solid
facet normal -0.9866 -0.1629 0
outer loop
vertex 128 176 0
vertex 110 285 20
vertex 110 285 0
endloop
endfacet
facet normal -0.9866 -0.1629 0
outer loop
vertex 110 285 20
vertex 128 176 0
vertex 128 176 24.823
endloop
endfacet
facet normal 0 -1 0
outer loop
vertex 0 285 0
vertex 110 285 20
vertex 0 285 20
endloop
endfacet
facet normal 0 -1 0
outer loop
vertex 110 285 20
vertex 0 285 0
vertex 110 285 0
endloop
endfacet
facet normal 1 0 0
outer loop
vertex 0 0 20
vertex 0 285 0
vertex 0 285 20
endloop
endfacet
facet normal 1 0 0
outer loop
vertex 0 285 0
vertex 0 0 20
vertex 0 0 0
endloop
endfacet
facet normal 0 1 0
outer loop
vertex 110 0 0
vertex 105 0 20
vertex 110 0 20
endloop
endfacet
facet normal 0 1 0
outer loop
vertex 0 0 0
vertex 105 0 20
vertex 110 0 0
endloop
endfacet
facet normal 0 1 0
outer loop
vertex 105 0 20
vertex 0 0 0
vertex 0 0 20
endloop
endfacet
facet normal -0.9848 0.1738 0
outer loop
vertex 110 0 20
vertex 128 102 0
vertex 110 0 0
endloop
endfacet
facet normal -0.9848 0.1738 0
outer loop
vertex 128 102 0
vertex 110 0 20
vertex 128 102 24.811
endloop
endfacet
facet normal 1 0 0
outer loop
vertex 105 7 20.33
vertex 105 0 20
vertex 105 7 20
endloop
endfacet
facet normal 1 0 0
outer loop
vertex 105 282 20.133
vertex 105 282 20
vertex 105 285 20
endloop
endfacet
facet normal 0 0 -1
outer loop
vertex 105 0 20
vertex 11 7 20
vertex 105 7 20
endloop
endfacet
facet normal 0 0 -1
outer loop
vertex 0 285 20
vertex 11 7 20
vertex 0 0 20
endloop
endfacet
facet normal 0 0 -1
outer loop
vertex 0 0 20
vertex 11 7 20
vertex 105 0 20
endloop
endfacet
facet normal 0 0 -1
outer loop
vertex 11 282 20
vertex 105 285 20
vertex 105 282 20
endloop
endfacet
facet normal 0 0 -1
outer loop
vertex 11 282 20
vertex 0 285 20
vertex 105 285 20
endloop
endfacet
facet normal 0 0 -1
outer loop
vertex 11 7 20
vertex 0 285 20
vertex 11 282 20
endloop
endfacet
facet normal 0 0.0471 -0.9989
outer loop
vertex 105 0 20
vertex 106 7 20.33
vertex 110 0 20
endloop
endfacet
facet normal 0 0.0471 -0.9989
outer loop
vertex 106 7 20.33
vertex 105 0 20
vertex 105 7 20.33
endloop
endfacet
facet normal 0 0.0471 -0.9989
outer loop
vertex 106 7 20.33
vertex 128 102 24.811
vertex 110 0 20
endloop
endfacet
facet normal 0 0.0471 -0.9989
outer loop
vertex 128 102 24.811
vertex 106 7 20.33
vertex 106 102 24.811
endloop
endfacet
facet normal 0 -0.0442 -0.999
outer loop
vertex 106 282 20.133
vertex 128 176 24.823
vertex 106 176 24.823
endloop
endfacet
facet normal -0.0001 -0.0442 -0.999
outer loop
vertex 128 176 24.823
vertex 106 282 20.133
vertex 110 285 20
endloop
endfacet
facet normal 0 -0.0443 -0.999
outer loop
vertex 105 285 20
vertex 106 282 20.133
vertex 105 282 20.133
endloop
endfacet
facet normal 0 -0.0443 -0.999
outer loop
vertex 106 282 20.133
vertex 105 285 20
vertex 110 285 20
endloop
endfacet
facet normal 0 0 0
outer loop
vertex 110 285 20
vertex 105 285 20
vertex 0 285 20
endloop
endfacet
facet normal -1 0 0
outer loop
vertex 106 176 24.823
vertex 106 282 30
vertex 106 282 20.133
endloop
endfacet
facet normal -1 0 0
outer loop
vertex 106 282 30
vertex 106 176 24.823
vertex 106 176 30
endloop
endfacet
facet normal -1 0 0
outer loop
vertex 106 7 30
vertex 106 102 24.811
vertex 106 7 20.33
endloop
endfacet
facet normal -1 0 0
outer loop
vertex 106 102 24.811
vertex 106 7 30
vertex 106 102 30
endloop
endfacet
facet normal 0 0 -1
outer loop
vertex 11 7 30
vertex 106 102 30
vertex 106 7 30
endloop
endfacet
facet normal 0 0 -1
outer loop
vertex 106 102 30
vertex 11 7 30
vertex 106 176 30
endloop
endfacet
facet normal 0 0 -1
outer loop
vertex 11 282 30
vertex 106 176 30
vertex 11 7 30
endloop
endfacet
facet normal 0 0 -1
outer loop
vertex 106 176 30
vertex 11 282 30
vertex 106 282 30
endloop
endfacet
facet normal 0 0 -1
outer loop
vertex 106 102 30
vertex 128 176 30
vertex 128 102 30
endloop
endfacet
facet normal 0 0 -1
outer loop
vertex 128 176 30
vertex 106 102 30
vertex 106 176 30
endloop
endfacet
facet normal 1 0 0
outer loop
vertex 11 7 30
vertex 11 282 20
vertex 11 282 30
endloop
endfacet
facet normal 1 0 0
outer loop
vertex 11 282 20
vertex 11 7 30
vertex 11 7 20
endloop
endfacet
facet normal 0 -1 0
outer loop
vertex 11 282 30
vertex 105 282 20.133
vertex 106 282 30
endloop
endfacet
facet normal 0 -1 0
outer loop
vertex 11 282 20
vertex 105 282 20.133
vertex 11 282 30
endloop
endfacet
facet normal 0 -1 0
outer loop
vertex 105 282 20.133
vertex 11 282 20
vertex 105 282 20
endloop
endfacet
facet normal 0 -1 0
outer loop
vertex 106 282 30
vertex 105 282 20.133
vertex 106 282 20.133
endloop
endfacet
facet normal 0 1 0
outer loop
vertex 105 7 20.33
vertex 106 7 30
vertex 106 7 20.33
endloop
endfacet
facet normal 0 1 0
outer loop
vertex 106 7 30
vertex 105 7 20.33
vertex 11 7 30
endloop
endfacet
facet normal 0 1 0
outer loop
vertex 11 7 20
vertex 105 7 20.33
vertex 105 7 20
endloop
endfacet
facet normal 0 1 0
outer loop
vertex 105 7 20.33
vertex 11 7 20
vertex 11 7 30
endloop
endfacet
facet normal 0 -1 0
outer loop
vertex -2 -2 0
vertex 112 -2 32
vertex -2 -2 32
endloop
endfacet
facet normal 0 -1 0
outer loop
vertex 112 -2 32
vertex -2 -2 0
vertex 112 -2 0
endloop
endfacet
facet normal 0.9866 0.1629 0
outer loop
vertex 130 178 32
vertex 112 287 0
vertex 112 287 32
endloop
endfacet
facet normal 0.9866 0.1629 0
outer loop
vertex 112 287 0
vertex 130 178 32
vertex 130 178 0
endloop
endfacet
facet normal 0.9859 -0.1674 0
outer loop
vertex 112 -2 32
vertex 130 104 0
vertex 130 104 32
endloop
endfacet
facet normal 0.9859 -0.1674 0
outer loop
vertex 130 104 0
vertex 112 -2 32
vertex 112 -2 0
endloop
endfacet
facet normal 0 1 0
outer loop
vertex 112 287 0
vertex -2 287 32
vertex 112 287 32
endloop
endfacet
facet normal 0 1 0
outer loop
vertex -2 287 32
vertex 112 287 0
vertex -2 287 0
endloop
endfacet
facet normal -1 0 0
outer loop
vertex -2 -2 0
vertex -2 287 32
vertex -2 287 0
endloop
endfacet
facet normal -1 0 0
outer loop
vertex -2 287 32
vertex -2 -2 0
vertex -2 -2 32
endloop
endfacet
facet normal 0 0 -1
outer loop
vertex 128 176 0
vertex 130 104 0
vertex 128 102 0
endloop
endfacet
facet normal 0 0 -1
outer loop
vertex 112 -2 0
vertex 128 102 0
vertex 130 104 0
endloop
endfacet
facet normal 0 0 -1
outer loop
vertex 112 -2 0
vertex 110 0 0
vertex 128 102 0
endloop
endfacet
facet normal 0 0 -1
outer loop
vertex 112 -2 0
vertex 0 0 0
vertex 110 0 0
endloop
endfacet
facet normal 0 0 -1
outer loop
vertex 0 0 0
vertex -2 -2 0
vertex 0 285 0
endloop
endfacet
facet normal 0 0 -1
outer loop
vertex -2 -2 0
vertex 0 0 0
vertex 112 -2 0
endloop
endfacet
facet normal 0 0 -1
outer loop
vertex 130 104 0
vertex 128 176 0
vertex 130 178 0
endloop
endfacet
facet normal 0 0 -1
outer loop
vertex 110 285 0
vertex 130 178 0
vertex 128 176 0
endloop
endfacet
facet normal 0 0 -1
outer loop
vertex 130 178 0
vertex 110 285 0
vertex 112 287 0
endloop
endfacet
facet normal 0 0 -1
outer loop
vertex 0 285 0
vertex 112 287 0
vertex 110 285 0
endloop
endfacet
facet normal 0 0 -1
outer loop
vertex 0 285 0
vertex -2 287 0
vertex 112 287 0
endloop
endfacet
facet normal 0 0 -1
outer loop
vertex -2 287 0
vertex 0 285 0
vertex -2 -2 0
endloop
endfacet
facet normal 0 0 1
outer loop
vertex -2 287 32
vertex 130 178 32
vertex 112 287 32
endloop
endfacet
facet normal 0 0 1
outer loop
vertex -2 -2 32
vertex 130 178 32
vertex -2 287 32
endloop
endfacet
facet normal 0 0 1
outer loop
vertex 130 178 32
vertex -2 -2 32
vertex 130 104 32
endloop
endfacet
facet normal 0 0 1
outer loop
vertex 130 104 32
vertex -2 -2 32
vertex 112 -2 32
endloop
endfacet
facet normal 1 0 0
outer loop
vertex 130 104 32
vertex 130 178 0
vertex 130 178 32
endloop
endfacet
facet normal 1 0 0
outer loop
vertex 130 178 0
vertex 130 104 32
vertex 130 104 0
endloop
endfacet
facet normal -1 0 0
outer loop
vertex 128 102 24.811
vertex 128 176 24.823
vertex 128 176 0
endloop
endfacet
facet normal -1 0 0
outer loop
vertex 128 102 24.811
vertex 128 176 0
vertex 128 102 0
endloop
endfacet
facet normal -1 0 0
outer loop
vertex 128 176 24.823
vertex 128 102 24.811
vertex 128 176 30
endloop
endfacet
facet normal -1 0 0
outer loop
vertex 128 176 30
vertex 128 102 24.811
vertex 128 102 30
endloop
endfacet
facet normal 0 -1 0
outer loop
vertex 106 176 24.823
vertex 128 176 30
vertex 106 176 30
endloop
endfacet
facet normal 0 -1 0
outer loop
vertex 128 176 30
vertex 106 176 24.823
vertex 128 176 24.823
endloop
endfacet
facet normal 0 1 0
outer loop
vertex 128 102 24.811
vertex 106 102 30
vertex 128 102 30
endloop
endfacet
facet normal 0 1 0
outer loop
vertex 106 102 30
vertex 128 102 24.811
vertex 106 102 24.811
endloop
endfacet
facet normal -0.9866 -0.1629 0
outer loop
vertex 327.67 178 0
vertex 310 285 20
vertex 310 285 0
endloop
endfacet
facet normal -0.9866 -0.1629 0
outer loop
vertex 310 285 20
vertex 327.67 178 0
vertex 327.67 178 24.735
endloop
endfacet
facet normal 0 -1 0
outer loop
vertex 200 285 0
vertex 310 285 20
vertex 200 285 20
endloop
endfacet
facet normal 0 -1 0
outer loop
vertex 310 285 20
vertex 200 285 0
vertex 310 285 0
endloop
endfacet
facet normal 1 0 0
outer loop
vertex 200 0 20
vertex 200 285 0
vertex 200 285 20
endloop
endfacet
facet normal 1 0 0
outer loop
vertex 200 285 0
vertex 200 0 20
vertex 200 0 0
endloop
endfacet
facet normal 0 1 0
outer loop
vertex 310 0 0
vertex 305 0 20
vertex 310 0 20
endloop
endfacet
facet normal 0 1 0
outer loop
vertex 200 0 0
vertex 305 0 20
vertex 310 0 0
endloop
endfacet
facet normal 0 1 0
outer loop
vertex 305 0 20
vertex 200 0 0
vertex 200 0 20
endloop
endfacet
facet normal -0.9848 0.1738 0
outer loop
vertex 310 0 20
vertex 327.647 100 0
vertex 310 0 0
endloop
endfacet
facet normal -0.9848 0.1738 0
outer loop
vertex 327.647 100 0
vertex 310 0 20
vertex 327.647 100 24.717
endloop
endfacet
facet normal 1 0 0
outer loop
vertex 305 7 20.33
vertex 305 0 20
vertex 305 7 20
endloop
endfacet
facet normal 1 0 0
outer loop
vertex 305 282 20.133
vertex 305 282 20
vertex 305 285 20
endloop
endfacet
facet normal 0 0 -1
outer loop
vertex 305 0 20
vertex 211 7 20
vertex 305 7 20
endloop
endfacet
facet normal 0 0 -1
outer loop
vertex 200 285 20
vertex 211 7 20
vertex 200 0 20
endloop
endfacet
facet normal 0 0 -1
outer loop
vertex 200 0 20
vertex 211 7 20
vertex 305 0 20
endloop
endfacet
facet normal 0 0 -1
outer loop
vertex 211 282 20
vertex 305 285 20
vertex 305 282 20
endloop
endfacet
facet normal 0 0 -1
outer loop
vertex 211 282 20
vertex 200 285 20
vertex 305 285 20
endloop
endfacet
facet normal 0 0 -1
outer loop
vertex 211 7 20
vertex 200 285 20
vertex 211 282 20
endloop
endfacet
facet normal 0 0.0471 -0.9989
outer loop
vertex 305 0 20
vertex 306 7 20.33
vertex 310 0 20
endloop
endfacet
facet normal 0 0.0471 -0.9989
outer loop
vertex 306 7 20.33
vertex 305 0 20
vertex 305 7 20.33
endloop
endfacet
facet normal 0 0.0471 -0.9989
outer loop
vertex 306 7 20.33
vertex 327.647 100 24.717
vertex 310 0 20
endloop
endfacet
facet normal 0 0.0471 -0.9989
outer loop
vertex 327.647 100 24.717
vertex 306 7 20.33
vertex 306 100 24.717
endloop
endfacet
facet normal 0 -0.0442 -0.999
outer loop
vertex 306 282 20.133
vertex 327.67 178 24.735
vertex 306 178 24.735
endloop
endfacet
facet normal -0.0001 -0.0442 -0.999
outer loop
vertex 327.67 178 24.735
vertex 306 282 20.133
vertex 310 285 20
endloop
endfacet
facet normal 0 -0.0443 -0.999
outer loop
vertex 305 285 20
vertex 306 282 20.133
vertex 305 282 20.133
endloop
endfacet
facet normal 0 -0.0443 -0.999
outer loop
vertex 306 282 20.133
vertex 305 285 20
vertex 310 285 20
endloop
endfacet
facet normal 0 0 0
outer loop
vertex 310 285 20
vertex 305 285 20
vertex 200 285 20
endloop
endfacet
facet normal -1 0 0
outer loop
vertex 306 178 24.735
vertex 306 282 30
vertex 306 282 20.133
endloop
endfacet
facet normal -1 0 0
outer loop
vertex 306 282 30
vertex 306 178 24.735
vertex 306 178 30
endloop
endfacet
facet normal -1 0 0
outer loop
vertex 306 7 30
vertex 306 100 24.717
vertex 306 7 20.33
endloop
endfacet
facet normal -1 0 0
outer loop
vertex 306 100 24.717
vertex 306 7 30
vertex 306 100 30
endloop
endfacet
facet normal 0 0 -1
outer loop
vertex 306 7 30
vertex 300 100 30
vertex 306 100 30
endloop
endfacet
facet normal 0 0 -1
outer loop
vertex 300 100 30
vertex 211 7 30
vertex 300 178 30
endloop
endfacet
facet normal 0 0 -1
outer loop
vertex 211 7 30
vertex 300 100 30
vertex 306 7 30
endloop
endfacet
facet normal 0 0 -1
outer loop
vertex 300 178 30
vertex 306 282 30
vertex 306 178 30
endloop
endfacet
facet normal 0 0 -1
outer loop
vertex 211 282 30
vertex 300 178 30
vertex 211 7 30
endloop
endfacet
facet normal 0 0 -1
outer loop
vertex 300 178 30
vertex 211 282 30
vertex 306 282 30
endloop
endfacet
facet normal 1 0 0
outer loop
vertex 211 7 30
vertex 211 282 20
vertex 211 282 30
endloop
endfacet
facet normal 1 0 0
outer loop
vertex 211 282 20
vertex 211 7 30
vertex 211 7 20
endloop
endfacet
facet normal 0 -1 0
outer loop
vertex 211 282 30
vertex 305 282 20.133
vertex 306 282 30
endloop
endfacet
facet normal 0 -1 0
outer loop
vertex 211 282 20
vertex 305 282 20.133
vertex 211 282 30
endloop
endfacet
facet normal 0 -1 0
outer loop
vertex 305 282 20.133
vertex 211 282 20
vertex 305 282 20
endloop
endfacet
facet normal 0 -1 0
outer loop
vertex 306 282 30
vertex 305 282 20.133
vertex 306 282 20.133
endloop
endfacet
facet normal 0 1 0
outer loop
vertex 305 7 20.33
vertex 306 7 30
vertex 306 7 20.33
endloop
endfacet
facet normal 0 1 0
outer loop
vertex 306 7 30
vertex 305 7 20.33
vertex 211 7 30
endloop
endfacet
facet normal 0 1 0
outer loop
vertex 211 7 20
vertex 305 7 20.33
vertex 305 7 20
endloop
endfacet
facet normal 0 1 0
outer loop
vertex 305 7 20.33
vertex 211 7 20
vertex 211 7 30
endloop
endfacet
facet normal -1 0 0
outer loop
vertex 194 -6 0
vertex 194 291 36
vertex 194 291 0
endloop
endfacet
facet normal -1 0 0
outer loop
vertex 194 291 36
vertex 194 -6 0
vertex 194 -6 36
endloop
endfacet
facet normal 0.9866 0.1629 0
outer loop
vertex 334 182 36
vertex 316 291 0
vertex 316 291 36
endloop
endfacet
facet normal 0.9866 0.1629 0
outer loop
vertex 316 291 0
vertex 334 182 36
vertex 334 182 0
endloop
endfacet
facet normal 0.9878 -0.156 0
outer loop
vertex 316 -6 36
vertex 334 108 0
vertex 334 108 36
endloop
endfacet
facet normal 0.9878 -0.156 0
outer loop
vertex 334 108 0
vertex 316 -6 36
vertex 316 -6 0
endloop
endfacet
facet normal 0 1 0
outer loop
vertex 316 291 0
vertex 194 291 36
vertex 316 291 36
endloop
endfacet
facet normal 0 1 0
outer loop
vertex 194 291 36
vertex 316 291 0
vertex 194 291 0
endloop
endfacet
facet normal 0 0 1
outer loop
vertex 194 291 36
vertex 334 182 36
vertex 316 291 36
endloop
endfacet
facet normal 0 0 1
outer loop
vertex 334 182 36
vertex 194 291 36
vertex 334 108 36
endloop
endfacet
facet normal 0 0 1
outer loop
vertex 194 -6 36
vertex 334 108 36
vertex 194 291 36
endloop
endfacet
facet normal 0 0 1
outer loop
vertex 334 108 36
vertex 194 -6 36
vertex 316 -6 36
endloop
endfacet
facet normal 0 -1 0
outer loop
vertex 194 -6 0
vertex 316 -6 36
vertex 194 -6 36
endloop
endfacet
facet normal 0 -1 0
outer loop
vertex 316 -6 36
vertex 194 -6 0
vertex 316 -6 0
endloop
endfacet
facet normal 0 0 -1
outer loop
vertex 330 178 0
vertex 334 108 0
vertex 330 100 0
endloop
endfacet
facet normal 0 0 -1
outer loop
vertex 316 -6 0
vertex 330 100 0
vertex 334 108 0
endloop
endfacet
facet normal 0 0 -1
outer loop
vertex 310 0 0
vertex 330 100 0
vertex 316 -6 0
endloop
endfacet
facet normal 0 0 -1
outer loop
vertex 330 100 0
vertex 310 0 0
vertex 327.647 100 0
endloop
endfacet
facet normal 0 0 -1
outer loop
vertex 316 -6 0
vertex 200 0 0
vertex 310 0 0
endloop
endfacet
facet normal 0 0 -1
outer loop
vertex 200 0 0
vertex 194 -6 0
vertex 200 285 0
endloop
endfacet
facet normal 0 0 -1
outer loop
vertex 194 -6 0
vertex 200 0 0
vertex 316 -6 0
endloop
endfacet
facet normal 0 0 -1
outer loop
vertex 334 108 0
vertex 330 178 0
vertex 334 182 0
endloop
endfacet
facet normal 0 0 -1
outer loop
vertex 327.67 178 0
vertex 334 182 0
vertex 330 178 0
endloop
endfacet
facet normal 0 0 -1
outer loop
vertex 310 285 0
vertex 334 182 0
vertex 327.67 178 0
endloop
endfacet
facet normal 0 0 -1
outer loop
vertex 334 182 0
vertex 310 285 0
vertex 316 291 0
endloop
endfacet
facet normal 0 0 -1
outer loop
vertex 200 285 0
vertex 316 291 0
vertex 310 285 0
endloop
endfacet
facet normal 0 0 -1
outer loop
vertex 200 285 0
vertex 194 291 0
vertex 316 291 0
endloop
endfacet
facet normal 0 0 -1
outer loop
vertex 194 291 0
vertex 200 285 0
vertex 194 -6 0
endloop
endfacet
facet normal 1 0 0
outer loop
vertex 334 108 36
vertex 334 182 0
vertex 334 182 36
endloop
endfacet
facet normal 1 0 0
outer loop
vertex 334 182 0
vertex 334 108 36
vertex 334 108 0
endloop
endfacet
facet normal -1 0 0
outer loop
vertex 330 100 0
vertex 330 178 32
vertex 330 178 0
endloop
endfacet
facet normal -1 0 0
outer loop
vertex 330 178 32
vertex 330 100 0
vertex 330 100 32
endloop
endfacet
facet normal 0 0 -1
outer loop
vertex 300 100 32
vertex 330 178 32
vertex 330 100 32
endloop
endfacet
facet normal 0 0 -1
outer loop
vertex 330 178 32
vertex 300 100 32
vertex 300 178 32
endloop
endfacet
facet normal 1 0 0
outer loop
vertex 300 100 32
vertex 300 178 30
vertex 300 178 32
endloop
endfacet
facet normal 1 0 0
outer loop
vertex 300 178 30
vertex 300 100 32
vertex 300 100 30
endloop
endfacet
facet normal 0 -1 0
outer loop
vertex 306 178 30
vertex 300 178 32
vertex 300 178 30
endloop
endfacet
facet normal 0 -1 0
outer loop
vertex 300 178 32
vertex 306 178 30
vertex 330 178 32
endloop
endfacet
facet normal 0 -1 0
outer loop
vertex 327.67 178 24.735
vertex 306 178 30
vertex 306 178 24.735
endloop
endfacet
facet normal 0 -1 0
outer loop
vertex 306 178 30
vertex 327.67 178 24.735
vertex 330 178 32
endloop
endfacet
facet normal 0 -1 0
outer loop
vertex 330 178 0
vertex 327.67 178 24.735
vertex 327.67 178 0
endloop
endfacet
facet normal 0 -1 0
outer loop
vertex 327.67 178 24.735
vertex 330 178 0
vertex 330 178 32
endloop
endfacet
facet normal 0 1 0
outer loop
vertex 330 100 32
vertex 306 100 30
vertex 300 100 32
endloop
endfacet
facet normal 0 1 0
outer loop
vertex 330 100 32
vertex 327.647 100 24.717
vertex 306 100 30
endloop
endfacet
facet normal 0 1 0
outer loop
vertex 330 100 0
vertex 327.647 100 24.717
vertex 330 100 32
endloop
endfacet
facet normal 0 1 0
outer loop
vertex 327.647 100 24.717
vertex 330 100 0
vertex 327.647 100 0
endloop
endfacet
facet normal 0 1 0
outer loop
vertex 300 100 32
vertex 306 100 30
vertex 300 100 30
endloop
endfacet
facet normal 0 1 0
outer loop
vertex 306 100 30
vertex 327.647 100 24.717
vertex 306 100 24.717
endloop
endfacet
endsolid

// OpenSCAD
// file: uhk-rough.scad
// add the case
function basePoints() = [
    [0, 0], // 0
    [110, 0], // 1
    [128, 102], // 2
    [110, 106], // 3
    [110, 172], // 4
    [128, 176], // 5
    [110, 285], // 6
    [0, 285] // 7
];


module UhkRough() {
    union() {
      difference(){
        color("#69BE28") linear_extrude(25)
          polygon(basePoints());
        translate([-10, -10, 20]) cube([115, 295, 30]);
        translate([0, 0, 20]) rotate([atan(5/106), 0, 0]) cube([200, 200, 30]);
        translate([0, 172, 25]) rotate([-atan(5/(285-172)), 0, 0]) cube([200, 200, 30]);
      }
      // then add the keys
      translate([11, 7, 20])
        cube([95, 275, 10]);
    }
}

UhkRough();
// main file
use <uhk-rough.scad>
module UhkCover(depth = 2, margin = 0) {
    outsideCoverBottomPoints = [
        [-depth - margin, -depth - margin],
        [110 + depth + margin, -depth - margin],
        [128 + depth + margin, 102 + depth + margin],
        [128 + depth + margin, 176 + depth + margin],
        [110 + depth + margin, 285 + depth + margin],
        [-depth - margin, 285+ depth + margin]
    ];

    baseCasePoints = [
        [ -margin, -margin, 0], // 0
        [ 110 + margin, -margin, 0 ], // 1
        [ 128 + margin, 102 + margin, 0 ], // 2
        [ 128 + margin, 176 + margin, 0 ], // 3
        [ 110 + margin, 285 + margin, 0 ], // 4
        [ -margin, 285 + margin, 0 ] // 5
    ];

    topCasePoints = [
        [ -margin, -margin, 30 + margin], // 6
        [ 110 + margin, -margin, 30 + margin ], // 7
        [ 128 + margin, 102 + margin, 35 + margin ], // 8
        [ 128 + margin, 176 + margin, 35 + margin ], // 9
        [ 110 + margin, 285 + margin, 30 + margin ], // 10
        [ -margin, 285 + margin, 30 + margin ] // 11
    ];
    points = concat(baseCasePoints, topCasePoints);

    caseBottom = [ 0, 1, 2, 3, 4, 5 ];
    caseTop = [ 6, 7, 8 , 9, 10, 11 ];
    leftSide = [ 0, 1, 7, 6 ];
    rightSide = [ 4, 5, 11, 10 ];
    frontSide = [ 0, 5, 11, 6];
    backSideA = [ 1, 2, 8, 7 ];
    backSideB = [ 2, 3, 9, 8 ];
    backSideC = [ 3, 4, 10, 9 ];

    difference() {
      color("#A5ACAF") linear_extrude(30 + depth + margin)
          polygon(outsideCoverBottomPoints);
      translate([0, 0, -10]) linear_extrude(15)
          polygon(basePoints());
      UhkRough();
      translate([100, 102 - margin, - 10])
          cube([138 - 110 + margin, 176 - 102 + 2 * margin, 40 + margin]);
    }
}

UhkCover();

translate([200, 0, 0])
  UhkCover(4, 2);
